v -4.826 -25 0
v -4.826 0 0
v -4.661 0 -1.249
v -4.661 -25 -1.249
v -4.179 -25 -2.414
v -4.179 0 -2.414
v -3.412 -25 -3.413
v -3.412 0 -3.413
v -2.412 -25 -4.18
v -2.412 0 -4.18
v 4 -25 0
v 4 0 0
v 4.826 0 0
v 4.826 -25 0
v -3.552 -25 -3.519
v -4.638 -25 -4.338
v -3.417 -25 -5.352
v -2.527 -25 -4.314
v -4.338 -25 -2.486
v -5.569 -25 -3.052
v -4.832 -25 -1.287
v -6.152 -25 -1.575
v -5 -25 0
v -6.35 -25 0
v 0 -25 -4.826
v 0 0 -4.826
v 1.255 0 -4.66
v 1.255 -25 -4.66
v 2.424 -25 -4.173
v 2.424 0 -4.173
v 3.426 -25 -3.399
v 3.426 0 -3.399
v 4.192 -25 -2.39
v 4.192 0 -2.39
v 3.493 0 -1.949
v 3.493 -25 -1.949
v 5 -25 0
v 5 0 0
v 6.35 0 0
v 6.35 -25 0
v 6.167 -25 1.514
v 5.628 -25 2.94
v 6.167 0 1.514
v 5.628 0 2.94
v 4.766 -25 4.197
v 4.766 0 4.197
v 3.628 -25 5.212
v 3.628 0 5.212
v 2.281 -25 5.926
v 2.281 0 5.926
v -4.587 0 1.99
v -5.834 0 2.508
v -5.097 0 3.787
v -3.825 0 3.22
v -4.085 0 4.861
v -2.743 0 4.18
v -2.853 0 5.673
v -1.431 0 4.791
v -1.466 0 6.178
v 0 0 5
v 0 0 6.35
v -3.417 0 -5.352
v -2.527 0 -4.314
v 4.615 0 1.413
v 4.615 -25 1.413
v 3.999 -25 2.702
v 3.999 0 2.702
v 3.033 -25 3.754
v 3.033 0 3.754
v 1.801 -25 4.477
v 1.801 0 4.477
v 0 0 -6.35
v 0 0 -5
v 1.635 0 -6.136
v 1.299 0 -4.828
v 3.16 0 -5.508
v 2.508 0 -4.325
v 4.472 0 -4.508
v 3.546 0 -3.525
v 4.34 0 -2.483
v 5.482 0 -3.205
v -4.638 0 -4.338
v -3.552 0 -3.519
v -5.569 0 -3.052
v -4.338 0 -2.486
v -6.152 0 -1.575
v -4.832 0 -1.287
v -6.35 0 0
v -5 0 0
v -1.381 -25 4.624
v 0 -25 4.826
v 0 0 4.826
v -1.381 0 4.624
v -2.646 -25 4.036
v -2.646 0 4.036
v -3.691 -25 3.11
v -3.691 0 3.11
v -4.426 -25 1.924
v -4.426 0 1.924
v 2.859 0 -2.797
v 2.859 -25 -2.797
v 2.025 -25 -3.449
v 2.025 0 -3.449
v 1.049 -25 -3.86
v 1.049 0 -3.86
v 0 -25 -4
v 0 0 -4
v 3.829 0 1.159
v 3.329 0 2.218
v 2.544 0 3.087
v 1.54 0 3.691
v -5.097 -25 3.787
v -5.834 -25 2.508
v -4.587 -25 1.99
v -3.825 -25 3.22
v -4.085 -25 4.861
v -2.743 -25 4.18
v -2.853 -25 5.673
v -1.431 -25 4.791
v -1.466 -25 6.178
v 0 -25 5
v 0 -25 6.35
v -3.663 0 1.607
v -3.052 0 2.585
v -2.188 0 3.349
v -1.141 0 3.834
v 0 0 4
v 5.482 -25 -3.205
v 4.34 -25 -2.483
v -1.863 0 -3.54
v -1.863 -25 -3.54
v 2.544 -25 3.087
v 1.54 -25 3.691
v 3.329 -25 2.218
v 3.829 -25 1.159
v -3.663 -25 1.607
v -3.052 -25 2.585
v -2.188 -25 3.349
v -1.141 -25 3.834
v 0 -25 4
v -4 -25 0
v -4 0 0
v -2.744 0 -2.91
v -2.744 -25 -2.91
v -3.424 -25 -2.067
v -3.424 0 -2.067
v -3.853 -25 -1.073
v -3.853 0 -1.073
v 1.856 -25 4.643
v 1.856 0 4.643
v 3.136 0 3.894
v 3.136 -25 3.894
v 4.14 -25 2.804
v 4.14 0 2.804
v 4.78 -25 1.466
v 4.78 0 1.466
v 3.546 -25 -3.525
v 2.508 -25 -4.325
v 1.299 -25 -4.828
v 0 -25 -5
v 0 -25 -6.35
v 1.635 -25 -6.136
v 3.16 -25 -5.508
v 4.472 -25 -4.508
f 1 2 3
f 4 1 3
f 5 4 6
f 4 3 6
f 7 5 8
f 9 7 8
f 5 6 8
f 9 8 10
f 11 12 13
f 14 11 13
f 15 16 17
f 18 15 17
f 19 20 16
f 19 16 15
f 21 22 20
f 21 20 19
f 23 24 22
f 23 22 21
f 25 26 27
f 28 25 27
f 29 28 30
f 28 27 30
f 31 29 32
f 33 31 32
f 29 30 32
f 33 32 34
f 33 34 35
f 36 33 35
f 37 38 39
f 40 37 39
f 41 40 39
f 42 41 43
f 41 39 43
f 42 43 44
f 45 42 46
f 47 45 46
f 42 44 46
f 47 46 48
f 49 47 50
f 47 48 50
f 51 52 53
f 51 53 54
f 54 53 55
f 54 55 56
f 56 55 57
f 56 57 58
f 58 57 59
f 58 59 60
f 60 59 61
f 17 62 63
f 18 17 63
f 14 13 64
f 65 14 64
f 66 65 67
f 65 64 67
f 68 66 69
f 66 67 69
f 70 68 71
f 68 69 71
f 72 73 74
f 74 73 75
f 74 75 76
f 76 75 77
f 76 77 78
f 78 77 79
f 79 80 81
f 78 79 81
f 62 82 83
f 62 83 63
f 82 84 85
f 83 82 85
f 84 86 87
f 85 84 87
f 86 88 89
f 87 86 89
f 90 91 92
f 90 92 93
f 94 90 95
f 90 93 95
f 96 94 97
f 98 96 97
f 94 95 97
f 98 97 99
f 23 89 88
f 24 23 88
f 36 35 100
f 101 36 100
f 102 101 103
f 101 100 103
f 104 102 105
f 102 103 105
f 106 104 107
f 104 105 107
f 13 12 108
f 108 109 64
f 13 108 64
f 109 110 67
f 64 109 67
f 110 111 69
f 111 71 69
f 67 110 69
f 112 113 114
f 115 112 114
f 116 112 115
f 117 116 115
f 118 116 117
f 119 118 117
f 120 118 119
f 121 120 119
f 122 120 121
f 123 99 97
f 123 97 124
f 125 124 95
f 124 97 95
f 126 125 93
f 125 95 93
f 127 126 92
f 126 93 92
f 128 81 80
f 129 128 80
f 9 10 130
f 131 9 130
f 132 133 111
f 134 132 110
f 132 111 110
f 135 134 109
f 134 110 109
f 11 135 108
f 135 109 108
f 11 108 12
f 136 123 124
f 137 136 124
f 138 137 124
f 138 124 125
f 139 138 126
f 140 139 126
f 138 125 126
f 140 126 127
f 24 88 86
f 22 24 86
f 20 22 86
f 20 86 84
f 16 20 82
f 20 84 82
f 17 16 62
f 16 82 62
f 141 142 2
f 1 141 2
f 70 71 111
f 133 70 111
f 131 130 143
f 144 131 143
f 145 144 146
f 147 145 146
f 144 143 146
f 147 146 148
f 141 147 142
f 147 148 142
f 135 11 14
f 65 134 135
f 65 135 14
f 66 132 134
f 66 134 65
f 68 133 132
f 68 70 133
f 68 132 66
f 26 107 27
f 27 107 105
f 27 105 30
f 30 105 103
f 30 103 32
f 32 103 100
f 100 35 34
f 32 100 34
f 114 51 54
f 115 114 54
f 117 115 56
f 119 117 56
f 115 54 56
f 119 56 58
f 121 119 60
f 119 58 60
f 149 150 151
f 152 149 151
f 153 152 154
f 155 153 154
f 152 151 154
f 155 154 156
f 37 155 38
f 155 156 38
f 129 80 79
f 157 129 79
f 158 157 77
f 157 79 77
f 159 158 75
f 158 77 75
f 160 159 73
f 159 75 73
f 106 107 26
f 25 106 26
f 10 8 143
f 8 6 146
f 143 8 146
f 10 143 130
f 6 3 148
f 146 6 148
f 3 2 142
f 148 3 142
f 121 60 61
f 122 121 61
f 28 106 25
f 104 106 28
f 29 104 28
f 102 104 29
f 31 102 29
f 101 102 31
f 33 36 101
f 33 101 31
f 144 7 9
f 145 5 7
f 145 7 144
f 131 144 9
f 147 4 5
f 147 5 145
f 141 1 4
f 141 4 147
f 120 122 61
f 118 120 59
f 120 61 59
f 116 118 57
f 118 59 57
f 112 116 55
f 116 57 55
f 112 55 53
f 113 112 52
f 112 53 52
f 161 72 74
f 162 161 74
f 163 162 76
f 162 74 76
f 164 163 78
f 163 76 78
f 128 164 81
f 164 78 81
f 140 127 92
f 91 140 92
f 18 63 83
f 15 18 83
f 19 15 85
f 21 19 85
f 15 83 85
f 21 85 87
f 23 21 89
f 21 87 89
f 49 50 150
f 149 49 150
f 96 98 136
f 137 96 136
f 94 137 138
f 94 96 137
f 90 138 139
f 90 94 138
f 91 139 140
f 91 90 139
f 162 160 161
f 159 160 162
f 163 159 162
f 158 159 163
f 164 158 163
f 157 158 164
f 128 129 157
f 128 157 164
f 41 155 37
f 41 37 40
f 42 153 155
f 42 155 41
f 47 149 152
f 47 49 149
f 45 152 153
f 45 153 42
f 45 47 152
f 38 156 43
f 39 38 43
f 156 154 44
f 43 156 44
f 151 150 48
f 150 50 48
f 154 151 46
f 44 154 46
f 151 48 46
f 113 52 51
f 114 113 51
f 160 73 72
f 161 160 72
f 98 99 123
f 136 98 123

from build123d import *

# Parameters (mm, degrees)
F1_DEPTH = 25


with BuildPart() as f1:
    # F0 (on Front) → F1 (new body)
    with BuildSketch(Plane.XZ):
        with BuildLine():
            Line((5.4819255413, -3.2048388976), (4.339626468, -2.4834738007))
            ThreePointArc((4.339626468, -2.4834738007), (2.5082494889, -4.3253536852), (0, -5))
            Line((0, -5), (0, -6.35))
            ThreePointArc((0, -6.35), (3.160045332, -5.5078683263), (5.4819255413, -3.2048388976))
        make_face()
    extrude(amount=F1_DEPTH)


with BuildPart() as f1b:
    # F0 (on Front) → F1, piece 2 (new body)
    with BuildSketch(Plane.XZ):
        with BuildLine():
            Line((-3.4167111614, -5.3524372803), (-2.5270187375, -4.314414943))
            ThreePointArc((-2.5270187375, -4.314414943), (-4.3379196447, -2.4864539321), (-5, 0))
            Line((-5, 0), (-6.35, 0))
            ThreePointArc((-6.35, 0), (-5.5686001776, -3.0517522938), (-3.4167111614, -5.3524372803))
        make_face()
    extrude(amount=F1_DEPTH)


with BuildPart() as f1c:
    # F0 (on Front) → F1, piece 3 (new body)
    with BuildSketch(Plane.XZ):
        with BuildLine():
            ThreePointArc((-4.5867578061, 1.9903901196), (-2.7429955707, 4.1804276455), (0, 5))
            Line((0, 5), (0, 6.35))
            ThreePointArc((0, 6.35), (-3.4926049616, 5.3032264313), (-5.8337243926, 2.508019081))
            Line((-5.8337243926, 2.508019081), (-4.5867578061, 1.9903901196))
        make_face()
    extrude(amount=F1_DEPTH)


with BuildPart() as f1d:
    # F0 (on Front) → F1, piece 4 (new body)
    with BuildSketch(Plane.XZ):
        with BuildLine():
            ThreePointArc((1.8557782902, 4.6428533186), (4.1399813678, 2.8036680036), (5, 0))
            Line((5, 0), (6.35, 0))
            ThreePointArc((6.35, 0), (5.2348521129, 3.5942764719), (2.2810792579, 5.9261435537))
            Line((2.2810792579, 5.9261435537), (1.8557782902, 4.6428533186))
        make_face()
    extrude(amount=F1_DEPTH)


with BuildPart() as f1e:
    # F0 (on Front) → F1, piece 5 (new body)
    with BuildSketch(Plane.XZ):
        with BuildLine():
            ThreePointArc((1.5404753982, 3.6914679394), (3.3288062119, 2.2178929649), (4, 0))
            Line((4, 0), (4.826, 0))
            ThreePointArc((4.826, 0), (3.99884969, 2.701754459), (1.800936943, 4.4773767015))
            Line((1.800936943, 4.4773767015), (1.5404753982, 3.6914679394))
        make_face()
    extrude(amount=F1_DEPTH)


with BuildPart() as f1f:
    # F0 (on Front) → F1, piece 6 (new body)
    with BuildSketch(Plane.XZ):
        with BuildLine():
            ThreePointArc((-3.6630244465, 1.6069386747), (-2.1877208804, 3.3487127899), (0, 4))
            Line((0, 4), (0, 4.826))
            ThreePointArc((0, 4.826), (-2.6463784586, 4.0357102292), (-4.42603258, 1.9236713858))
            Line((-4.42603258, 1.9236713858), (-3.6630244465, 1.6069386747))
        make_face()
    extrude(amount=F1_DEPTH)


with BuildPart() as f1g:
    # F0 (on Front) → F1, piece 7 (new body)
    with BuildSketch(Plane.XZ):
        with BuildLine():
            Line((-2.4118827565, -4.1800834404), (-1.8629850393, -3.5396732537))
            ThreePointArc((-1.8629850393, -3.5396732537), (-3.424320382, -2.0673727098), (-4, 0))
            Line((-4, 0), (-4.826, 0))
            ThreePointArc((-4.826, 0), (-4.1791160658, -2.4135585571), (-2.4118827565, -4.1800834404))
        make_face()
    extrude(amount=F1_DEPTH)


with BuildPart() as f1h:
    # F0 (on Front) → F1, piece 8 (new body)
    with BuildSketch(Plane.XZ):
        with BuildLine():
            Line((4.1923621722, -2.3904759812), (3.4931085088, -1.9488953143))
            ThreePointArc((3.4931085088, -1.9488953143), (2.0253911651, -3.4493174149), (0, -4))
            Line((0, -4), (0, -4.826))
            ThreePointArc((0, -4.826), (2.4242358502, -4.1729314088), (4.1923621722, -2.3904759812))
        make_face()
    extrude(amount=F1_DEPTH)


solid = Compound([f1.part, f1b.part, f1c.part, f1d.part, f1e.part, f1f.part, f1g.part, f1h.part])
